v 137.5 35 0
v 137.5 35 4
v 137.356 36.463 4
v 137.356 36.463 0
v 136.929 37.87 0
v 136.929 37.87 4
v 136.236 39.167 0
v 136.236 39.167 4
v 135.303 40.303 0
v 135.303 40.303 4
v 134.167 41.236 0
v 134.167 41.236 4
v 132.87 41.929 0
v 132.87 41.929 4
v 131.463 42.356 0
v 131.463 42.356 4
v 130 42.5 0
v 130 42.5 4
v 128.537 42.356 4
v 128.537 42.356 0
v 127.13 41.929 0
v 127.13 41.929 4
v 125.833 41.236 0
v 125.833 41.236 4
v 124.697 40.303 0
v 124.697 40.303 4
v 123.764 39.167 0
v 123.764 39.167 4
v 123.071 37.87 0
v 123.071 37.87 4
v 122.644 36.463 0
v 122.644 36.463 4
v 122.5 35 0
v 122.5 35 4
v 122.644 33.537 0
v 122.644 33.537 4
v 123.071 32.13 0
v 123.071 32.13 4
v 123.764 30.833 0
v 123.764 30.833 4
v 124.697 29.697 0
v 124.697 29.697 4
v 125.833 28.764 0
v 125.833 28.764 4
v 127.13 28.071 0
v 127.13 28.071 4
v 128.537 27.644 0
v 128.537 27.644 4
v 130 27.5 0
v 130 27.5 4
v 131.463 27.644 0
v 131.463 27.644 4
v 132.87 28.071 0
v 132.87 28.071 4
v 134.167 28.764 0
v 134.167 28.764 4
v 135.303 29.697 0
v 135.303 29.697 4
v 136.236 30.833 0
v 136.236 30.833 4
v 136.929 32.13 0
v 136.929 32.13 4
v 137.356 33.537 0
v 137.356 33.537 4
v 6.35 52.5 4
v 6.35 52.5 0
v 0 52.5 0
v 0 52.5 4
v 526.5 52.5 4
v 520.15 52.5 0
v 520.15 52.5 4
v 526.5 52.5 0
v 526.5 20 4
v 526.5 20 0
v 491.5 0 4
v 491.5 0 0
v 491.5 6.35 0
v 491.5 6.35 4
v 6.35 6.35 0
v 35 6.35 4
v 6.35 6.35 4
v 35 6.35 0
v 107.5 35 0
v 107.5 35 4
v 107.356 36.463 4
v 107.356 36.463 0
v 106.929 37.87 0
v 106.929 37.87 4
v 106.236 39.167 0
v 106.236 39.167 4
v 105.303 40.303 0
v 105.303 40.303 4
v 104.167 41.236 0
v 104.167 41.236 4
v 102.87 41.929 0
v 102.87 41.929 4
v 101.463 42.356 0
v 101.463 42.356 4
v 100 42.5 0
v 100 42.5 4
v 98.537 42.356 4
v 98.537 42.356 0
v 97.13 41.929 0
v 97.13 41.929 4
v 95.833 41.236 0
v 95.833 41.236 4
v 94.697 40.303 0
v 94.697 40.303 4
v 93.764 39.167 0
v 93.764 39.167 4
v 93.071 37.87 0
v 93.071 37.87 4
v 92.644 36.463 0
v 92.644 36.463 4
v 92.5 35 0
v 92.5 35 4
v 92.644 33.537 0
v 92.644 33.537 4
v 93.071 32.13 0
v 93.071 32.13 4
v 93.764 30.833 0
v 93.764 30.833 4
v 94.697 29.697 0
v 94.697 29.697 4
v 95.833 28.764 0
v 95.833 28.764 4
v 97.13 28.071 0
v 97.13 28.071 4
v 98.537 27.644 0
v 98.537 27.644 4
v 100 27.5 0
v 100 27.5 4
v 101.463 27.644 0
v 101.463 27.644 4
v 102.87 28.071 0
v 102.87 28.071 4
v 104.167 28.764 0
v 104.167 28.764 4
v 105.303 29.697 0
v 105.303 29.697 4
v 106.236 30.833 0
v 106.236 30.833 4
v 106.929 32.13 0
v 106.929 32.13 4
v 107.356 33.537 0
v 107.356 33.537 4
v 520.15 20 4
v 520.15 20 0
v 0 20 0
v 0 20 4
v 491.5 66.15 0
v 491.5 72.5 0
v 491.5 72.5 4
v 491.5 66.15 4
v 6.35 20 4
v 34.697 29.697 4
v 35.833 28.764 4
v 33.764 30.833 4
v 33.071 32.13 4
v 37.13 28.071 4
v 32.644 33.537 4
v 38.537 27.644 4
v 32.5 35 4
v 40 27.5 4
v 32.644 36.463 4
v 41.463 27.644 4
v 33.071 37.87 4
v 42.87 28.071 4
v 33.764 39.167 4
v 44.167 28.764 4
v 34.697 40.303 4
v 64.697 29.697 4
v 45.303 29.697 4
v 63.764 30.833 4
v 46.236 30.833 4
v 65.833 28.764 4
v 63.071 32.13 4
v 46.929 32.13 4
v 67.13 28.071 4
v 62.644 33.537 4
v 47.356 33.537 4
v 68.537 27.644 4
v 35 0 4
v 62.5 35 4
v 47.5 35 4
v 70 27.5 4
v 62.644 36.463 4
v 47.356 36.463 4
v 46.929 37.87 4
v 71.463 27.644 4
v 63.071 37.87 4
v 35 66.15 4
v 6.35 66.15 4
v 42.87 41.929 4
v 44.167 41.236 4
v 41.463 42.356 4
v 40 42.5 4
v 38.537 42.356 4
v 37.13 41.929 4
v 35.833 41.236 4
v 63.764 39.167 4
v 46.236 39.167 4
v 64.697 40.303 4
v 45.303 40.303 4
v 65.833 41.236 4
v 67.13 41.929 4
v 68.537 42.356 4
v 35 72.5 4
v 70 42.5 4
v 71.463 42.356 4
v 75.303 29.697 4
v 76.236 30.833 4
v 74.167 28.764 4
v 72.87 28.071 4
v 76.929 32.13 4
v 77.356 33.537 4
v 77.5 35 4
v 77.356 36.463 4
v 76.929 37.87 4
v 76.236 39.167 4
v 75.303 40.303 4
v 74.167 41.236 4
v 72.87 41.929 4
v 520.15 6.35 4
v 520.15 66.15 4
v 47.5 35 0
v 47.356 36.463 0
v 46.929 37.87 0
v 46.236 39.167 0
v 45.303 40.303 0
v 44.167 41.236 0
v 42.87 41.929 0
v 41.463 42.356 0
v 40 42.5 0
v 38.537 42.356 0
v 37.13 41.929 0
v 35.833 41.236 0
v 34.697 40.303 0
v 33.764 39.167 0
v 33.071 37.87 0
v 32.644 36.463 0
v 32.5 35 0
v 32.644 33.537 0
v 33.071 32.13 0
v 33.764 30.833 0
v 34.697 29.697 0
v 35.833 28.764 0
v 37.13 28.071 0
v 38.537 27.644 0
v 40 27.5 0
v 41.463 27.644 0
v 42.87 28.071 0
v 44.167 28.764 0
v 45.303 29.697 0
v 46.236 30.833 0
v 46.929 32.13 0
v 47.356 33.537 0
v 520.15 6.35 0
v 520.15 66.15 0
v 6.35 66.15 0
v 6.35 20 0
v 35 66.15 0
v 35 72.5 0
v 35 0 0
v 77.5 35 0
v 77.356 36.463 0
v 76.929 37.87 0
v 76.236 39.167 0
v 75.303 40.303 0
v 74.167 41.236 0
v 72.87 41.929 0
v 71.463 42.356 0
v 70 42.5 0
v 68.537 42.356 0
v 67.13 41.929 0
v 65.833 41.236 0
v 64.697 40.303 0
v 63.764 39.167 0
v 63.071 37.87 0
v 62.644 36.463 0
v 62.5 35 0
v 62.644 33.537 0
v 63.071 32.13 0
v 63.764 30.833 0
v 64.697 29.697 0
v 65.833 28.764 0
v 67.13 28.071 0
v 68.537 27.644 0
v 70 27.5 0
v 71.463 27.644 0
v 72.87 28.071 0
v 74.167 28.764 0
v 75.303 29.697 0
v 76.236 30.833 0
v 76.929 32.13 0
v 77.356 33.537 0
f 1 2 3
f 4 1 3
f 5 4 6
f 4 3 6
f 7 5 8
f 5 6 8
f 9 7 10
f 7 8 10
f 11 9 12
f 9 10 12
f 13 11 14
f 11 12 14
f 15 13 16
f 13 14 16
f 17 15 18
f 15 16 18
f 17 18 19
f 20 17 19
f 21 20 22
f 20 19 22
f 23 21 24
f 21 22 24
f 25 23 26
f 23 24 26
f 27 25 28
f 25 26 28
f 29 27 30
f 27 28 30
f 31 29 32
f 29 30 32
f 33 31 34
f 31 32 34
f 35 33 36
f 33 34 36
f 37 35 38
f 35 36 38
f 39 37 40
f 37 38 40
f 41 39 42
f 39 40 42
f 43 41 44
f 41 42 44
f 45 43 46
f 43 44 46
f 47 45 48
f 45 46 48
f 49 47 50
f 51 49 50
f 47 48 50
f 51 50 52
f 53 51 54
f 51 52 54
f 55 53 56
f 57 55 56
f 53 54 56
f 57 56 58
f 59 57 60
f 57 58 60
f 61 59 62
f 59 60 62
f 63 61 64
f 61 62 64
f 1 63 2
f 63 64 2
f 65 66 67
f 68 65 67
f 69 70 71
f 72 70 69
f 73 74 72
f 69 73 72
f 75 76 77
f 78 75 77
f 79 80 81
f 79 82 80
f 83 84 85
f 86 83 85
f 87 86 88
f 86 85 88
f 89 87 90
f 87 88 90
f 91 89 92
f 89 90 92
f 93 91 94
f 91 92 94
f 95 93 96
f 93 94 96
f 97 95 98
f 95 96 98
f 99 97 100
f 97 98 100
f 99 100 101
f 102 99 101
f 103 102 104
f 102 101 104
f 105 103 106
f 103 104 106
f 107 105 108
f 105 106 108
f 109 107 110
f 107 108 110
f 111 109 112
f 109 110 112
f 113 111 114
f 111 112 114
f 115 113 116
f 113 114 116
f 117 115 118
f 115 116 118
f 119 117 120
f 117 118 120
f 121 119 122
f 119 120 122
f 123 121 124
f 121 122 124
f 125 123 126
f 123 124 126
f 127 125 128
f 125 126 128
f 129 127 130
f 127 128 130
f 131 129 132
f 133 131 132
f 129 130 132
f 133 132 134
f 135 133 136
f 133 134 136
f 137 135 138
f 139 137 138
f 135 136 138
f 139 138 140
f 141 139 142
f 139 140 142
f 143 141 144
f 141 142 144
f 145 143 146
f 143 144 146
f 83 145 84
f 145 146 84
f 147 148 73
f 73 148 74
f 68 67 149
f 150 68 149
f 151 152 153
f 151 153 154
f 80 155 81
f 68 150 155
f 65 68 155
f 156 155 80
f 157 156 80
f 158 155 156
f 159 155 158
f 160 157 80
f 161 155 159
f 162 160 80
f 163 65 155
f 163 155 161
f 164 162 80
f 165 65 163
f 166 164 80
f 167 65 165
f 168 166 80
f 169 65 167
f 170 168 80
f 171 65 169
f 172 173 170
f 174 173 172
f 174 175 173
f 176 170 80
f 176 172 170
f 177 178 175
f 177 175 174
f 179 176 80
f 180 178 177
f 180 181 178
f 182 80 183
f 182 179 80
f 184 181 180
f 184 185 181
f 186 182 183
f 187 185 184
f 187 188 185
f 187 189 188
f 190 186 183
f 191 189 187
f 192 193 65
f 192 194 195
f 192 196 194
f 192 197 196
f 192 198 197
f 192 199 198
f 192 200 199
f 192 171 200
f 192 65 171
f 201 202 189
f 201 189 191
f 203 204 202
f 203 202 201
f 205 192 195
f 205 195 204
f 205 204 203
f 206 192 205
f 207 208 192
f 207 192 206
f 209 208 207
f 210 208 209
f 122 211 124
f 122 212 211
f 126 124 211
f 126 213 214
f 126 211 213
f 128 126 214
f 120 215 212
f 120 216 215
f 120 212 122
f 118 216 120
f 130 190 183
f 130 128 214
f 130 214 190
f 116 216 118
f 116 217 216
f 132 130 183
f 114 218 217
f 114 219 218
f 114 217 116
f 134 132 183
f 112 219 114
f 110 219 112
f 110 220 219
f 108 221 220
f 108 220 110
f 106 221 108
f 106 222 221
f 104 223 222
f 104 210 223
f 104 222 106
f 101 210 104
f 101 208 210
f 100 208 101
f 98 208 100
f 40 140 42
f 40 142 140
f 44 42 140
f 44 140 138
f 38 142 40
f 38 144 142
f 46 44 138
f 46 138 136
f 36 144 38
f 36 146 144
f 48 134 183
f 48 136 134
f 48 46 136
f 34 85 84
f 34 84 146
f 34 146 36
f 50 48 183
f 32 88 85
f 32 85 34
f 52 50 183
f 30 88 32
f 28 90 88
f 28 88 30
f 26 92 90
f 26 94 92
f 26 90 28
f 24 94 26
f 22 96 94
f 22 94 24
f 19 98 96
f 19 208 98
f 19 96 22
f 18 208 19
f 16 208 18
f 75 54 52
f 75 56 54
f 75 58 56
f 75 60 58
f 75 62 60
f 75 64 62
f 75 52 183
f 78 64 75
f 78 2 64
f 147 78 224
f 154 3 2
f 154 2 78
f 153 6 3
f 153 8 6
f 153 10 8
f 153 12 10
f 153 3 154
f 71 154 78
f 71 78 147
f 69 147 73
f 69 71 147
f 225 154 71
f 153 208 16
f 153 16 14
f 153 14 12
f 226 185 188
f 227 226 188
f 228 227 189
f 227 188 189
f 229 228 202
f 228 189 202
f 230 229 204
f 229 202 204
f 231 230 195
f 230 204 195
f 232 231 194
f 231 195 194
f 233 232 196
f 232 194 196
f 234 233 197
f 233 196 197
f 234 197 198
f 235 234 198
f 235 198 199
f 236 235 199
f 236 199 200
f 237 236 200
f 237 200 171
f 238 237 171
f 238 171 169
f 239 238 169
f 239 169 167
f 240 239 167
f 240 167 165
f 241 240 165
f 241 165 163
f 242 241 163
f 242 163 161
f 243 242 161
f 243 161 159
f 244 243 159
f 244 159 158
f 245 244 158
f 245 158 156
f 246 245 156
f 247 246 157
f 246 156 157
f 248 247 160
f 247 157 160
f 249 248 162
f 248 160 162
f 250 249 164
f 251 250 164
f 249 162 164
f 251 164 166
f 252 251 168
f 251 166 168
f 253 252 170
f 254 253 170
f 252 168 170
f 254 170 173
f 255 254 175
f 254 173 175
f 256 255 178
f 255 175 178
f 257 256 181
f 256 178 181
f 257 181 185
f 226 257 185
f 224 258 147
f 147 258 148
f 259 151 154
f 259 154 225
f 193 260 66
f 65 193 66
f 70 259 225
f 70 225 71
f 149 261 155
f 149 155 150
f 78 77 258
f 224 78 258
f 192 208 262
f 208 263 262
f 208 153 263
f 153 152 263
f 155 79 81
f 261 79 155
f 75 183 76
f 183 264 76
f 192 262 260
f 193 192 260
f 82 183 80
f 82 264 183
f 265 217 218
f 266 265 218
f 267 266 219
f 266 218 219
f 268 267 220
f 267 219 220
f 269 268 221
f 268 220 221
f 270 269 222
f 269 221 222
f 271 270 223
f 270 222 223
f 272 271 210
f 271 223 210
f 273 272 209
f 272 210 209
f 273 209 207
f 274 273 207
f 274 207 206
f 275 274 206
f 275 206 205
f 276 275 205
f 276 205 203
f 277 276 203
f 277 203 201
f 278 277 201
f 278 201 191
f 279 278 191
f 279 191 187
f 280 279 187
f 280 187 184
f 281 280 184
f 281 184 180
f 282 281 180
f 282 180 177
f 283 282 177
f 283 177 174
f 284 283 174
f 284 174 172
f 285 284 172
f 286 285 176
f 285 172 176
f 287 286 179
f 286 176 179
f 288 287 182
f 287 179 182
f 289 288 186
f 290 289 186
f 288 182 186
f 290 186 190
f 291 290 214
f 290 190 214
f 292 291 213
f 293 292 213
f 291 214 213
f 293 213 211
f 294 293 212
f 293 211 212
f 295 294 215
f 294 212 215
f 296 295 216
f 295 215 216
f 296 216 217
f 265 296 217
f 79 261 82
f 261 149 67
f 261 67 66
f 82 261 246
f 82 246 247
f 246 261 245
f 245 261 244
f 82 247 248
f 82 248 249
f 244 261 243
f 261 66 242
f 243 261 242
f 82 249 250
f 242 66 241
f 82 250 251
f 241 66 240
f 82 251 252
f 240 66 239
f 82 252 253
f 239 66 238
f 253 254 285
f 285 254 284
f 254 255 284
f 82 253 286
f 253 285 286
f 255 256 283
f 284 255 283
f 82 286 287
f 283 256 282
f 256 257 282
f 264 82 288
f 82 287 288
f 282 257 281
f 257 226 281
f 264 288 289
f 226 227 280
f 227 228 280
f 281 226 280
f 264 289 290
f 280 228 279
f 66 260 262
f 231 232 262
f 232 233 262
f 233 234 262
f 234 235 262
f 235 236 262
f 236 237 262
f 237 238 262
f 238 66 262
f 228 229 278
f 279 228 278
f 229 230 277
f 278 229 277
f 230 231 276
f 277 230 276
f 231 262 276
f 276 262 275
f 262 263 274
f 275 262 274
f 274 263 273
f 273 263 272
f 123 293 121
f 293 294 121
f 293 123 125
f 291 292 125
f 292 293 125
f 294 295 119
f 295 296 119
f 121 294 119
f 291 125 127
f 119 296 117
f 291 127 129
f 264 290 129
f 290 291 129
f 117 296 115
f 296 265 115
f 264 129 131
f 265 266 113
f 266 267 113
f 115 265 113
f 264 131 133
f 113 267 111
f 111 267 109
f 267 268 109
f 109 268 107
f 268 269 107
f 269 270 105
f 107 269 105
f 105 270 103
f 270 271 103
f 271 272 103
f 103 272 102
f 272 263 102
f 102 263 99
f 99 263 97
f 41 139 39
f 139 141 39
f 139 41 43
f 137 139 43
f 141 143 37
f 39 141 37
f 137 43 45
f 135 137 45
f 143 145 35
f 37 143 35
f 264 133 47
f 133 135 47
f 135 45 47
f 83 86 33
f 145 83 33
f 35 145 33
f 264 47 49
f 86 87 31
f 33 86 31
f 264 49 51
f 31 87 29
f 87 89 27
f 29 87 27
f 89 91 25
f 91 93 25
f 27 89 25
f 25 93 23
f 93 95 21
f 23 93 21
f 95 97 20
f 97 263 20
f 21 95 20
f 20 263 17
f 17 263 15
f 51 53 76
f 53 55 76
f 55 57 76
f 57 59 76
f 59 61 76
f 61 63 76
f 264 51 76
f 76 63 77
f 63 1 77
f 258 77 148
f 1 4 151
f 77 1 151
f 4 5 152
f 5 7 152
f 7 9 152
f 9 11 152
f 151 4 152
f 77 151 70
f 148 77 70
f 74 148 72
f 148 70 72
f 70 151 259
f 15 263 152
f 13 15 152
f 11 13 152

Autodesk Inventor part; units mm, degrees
ref_plane "YZ Plane" through (0, 0, 0) normal (1, 0, 0) x (0, 1, 0)
ref_plane "XZ Plane" through (0, 0, 0) normal (0, 1, 0) x (-1, 0, 0)
ref_plane "XY Plane" through (0, 0, 0) normal (0, 0, 1) x (1, 0, 0)
sketch "Skizze1" plane through (0, 0, 0) normal (0, 0, 1) x (1, 0, 0)
  line L0 (0, 0) -> (526.5, 0)
  line L1 (526.5, 0) -> (526.5, 72.5)
  line L2 (526.5, 72.5) -> (0, 72.5)
  line L3 (0, 72.5) -> (0, 0)
  line L4 (0, 72.5) -> (35, 72.5)
  line L5 (35, 72.5) -> (35, 66.15)
  line L6 (35, 66.15) -> (0, 66.15)
  line L7 (0, 66.15) -> (0, 72.5)
  line L8 (0, 72.5) -> (6.35, 72.5)
  line L9 (6.35, 72.5) -> (6.35, 52.5)
  line L10 (6.35, 52.5) -> (0, 52.5)
  line L11 (0, 52.5) -> (0, 72.5)
  line L12 (0, 36.25) -> (526.5, 36.25) construction
  line L13 (263.25, 72.5) -> (263.25, 0) construction
  line L14 (0, 0) -> (35, 0)
  line L15 (35, 0) -> (35, 6.35)
  line L16 (35, 6.35) -> (0, 6.35)
  line L17 (0, 6.35) -> (0, 0)
  line L18 (0, 0) -> (6.35, 0)
  line L19 (6.35, 0) -> (6.35, 20)
  line L20 (6.35, 20) -> (0, 20)
  line L21 (0, 20) -> (0, 0)
  line L22 (526.5, 72.5) -> (526.5, 0)
  line L23 (526.5, 72.5) -> (491.5, 72.5)
  line L24 (491.5, 72.5) -> (491.5, 66.15)
  line L25 (491.5, 66.15) -> (526.5, 66.15)
  line L26 (526.5, 66.15) -> (526.5, 72.5)
  line L27 (526.5, 72.5) -> (520.15, 72.5)
  line L28 (520.15, 72.5) -> (520.15, 52.5)
  line L29 (520.15, 52.5) -> (526.5, 52.5)
  line L30 (526.5, 52.5) -> (526.5, 72.5)
  line L31 (526.5, 0) -> (520.15, 0)
  line L32 (526.5, 0) -> (491.5, 0)
  line L33 (491.5, 0) -> (491.5, 6.35)
  line L34 (491.5, 6.35) -> (526.5, 6.35)
  line L35 (520.15, 0) -> (520.15, 20)
  line L36 (526.5, 6.35) -> (526.5, 0)
  line L37 (520.15, 20) -> (526.5, 20)
  line L38 (526.5, 20) -> (526.5, 0)
  point P0 (520.15, 66.15)
  point P1 (6.35, 66.15)
  point P2 (0, 52.5)
  point P3 (0, 20)
  point P4 (6.35, 6.35)
  point P5 (491.5, 0)
  point P6 (520.15, 6.35)
  point P7 (526.5, 20)
  dimension "d0" = 526.5
  dimension "d1" = 72.5
  dimension "d2" = 35
  dimension "d3" = 6.35
  dimension "d4" = 6.35
  dimension "d5" = 20
extrude "Extrusion1" add sketch "Skizze1" along normal blind 4 contours L15 L16 L19 L20 L3 L10 L9 L6 L5 L2 L24 L25 L28 L29 L1 L37 L35 L34 L33 L0
sketch "Skizze2" plane through (0, 0, 4) normal (0, 0, 1) x (1, 0, 0)
  circle A0 centre (40, 35) radius 7.5
  circle A1 centre (70, 35) radius 7.5
  circle A2 centre (100, 35) radius 7.5
  circle A3 centre (130, 35) radius 7.5
  line L0 (35, 0) -> (491.5, 0) projected
  line L1 (0, 52.5) -> (0, 20) projected
  point P0 (0, 0)
  dimension "d8" = 15
  dimension "d9" = 15
  dimension "d10" = 15
  dimension "d11" = 15
  dimension "d12" = 35
  dimension "d13" = 30
  dimension "d14" = 40
  dimension "d15" = 30
  dimension "d16" = 30
extrude "Extrusion2" cut sketch "Skizze2" against normal blind 10
properties part number "103.013.01_Abdeckung_Gestell_hinten" material "PMMA-Kunststoff"
